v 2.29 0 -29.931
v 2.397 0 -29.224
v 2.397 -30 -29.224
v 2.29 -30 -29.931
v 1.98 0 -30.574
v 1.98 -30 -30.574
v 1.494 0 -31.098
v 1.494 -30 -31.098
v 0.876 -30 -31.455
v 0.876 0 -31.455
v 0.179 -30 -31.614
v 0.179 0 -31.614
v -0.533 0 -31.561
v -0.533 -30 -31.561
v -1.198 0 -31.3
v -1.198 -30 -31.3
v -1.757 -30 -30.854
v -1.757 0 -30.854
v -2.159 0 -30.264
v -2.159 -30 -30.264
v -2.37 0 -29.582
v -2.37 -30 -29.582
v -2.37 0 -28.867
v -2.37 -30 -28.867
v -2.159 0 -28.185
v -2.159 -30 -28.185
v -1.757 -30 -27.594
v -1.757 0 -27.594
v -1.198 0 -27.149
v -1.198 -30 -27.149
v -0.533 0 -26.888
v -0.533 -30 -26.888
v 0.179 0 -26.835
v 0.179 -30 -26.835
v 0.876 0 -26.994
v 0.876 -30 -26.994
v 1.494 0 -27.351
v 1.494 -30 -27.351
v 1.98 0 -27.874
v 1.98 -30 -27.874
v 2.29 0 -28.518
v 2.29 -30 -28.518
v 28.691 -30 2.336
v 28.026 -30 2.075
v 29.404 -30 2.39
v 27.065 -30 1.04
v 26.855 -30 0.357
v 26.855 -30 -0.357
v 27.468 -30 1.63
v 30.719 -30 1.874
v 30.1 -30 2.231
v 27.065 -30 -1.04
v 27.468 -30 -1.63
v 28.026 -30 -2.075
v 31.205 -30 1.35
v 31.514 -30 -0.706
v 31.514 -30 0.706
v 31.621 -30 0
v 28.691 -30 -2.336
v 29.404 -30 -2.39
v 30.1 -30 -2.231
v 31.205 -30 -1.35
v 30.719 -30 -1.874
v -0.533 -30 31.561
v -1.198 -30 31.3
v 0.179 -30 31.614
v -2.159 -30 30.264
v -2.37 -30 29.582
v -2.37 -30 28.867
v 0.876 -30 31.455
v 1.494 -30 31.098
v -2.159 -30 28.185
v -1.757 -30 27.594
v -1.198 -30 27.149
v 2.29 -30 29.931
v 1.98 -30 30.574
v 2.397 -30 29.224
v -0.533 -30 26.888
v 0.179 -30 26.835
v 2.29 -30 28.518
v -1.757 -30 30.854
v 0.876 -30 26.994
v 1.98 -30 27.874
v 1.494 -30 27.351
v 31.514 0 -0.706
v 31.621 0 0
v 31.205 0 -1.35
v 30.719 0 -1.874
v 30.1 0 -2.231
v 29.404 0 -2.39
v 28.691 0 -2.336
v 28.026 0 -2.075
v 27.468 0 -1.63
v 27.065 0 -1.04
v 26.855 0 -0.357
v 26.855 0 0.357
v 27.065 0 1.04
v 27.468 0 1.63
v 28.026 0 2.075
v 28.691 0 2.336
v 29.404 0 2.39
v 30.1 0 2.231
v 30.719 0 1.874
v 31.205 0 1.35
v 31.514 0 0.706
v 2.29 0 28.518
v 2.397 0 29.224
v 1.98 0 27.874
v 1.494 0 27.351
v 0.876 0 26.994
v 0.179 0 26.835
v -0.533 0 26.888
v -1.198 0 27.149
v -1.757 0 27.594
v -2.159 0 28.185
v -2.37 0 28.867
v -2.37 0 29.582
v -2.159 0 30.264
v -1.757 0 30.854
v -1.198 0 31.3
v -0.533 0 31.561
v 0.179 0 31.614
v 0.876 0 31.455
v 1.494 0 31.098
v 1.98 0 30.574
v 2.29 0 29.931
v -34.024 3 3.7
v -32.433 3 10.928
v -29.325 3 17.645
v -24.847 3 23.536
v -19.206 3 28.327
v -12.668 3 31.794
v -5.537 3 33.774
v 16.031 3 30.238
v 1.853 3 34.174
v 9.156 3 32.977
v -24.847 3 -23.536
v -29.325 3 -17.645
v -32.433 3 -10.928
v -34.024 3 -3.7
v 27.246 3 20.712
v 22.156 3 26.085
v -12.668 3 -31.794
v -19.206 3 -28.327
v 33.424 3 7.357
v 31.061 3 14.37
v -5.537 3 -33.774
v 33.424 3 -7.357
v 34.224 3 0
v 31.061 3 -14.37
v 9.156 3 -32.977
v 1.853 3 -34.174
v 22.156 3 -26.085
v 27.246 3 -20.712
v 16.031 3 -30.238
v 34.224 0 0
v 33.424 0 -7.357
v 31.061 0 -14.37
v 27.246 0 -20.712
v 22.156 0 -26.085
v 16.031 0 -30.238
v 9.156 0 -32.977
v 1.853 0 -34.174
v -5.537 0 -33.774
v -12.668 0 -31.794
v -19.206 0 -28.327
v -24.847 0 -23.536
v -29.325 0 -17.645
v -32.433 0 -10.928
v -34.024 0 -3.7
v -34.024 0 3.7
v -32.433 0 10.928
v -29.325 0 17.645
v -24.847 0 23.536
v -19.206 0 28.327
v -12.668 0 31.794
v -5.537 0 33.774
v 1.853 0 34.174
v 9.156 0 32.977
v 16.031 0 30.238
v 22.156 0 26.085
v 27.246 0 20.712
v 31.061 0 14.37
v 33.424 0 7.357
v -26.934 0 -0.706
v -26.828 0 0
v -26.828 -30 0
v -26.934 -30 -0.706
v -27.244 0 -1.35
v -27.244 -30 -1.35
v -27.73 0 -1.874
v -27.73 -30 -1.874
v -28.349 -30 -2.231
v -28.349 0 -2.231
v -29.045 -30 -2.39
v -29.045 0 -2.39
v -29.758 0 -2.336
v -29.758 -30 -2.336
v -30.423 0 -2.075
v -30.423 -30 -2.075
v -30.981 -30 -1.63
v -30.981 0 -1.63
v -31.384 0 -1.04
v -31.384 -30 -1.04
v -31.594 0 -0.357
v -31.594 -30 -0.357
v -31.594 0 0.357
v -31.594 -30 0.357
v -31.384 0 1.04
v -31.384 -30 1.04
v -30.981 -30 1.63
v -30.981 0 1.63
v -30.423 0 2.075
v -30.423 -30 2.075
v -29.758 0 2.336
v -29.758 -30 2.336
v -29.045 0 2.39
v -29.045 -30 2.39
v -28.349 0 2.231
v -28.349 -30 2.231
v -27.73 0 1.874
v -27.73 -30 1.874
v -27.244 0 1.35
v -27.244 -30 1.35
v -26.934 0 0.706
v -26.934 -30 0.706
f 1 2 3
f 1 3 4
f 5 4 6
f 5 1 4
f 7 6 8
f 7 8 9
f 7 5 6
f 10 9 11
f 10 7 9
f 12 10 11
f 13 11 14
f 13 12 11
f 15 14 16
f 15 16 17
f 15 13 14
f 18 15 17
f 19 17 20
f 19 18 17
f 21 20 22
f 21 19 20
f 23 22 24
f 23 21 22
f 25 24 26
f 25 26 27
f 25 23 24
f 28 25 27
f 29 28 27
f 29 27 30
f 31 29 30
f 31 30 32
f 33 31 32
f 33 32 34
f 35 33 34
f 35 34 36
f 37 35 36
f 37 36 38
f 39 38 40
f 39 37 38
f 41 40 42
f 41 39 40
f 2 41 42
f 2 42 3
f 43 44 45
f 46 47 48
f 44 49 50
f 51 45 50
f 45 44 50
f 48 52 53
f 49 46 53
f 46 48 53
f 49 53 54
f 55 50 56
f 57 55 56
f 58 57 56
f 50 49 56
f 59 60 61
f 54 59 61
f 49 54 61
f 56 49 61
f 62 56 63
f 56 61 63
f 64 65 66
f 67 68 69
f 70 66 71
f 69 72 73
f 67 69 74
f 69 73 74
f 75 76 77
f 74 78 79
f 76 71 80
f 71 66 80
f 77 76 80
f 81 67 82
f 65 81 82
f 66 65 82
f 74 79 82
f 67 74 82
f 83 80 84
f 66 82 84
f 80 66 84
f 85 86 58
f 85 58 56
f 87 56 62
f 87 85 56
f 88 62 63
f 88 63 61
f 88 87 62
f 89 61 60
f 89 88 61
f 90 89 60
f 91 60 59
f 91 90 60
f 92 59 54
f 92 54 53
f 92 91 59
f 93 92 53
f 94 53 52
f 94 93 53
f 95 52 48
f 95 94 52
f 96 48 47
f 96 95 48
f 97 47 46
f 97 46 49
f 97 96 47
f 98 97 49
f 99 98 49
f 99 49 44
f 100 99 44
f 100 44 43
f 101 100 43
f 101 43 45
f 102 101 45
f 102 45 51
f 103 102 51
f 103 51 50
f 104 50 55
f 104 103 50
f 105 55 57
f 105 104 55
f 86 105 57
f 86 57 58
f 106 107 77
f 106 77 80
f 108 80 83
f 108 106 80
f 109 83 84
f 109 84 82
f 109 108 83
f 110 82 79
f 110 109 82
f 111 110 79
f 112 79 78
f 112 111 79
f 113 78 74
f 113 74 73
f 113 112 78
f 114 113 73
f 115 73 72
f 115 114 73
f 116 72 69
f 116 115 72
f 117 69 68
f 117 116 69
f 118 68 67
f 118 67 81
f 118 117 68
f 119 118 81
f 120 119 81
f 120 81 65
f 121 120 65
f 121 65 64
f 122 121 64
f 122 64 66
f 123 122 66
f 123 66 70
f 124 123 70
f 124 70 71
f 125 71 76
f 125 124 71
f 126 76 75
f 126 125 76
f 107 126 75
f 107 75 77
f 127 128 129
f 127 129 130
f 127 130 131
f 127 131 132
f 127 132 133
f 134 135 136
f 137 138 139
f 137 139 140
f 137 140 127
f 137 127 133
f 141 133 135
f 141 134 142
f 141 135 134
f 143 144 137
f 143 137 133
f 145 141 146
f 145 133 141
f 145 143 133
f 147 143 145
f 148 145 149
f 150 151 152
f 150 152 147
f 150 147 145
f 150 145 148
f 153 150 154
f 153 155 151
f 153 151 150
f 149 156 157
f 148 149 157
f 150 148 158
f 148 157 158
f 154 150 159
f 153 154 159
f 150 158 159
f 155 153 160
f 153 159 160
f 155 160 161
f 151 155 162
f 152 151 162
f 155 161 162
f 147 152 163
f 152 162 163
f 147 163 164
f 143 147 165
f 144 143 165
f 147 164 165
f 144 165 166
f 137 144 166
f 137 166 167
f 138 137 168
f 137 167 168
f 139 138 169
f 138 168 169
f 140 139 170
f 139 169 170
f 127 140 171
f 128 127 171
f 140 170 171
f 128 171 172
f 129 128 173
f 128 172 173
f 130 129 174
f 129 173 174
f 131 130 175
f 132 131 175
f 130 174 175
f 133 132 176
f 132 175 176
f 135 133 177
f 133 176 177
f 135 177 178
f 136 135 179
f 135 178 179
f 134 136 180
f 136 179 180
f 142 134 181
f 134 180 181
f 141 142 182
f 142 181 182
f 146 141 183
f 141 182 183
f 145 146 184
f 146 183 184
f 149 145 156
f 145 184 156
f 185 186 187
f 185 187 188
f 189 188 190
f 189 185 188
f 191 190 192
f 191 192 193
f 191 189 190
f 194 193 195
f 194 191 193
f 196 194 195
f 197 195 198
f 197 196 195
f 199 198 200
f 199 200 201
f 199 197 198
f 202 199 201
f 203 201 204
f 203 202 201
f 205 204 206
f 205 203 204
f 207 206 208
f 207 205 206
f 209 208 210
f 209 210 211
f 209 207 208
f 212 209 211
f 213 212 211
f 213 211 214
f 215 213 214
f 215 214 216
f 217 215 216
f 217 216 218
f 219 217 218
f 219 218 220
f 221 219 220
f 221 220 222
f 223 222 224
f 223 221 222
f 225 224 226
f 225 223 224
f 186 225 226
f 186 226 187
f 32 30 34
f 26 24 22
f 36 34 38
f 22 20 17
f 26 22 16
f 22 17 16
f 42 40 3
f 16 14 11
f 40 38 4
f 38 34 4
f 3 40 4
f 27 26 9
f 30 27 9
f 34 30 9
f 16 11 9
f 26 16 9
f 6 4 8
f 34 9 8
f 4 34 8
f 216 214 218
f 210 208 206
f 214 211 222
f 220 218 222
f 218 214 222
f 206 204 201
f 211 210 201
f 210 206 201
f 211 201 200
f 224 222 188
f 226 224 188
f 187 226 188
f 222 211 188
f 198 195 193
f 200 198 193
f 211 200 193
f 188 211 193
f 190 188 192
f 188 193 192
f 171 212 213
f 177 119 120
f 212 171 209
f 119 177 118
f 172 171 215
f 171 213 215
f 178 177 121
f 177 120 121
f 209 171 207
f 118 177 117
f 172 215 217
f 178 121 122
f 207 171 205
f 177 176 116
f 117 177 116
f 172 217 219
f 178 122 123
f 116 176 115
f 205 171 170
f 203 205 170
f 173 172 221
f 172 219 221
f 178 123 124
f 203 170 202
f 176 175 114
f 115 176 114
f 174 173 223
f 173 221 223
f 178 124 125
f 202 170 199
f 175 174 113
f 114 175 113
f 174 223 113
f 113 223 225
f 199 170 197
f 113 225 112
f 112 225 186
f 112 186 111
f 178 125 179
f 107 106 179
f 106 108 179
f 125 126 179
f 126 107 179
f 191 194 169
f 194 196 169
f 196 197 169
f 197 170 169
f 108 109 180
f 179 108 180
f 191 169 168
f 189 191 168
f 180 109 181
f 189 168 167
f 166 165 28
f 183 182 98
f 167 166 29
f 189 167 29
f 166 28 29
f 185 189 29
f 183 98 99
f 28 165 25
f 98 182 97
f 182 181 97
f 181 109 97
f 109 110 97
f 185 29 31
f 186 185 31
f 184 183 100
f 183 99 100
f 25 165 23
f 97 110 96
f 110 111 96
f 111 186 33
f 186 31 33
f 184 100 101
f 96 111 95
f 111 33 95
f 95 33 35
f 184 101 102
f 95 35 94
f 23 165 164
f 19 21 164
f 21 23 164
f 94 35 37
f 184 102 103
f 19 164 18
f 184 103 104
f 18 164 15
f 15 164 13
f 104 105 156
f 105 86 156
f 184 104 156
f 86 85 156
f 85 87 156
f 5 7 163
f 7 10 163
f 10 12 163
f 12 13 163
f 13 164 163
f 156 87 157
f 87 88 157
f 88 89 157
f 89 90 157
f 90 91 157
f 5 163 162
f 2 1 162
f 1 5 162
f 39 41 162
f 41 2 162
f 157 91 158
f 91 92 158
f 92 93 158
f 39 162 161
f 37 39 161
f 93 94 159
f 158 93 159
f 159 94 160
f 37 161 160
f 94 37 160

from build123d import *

# Parameters (mm, degrees)
IZIM2_R                     = 34.224414592
Y_KSEKLIK_EKSTR_ZYON6_DEPTH = 3
IZIM2_3_R                   = 2.396512678
Y_KSEKLIK_EKSTR_ZYON7_DEPTH = 30


with BuildPart() as part:
    # Çizim2 → Yükseklik-Ekstrüzyon6 (new body)
    with BuildSketch(Plane(origin=(0, 0, 0), x_dir=(1, 0, 0), z_dir=(0, 1, 0))):
        Circle(IZIM2_R)
    extrude(amount=Y_KSEKLIK_EKSTR_ZYON6_DEPTH)

    # Çizim2<3> → Yükseklik-Ekstrüzyon7 (add)
    with BuildSketch(Plane(origin=(0, 0, 0), x_dir=(1, 0, 0), z_dir=(0, 1, 0))):
        with Locations((0, 29.224414592)):
            Circle(IZIM2_3_R)
        with Locations((-29.224414592, 0)):
            Circle(IZIM2_3_R)
        with Locations((29.224414592, 0)):
            Circle(IZIM2_3_R)
        with Locations((0, -29.224414592)):
            Circle(IZIM2_3_R)
    extrude(amount=-Y_KSEKLIK_EKSTR_ZYON7_DEPTH)


solid = part.part
